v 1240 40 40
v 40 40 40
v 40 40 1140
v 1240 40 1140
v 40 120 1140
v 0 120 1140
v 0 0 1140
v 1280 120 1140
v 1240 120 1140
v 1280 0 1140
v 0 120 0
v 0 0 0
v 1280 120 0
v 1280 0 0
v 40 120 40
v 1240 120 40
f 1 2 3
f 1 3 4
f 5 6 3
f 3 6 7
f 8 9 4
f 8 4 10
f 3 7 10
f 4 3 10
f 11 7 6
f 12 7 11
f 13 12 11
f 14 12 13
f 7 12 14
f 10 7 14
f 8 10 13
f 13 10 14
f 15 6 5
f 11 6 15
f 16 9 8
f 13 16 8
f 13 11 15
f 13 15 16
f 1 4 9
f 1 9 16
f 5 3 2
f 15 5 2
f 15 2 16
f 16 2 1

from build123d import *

# Parameters (mm, degrees)
SKETCH1_W           = 1280
SKETCH1_H           = 1140
BOSS_EXTRUDE1_DEPTH = 40
SKETCH2_W           = 40
SKETCH2_H           = 1140
BOSS_EXTRUDE2_DEPTH = 80
SKETCH3_W           = 1200
SKETCH3_H           = 40
BOSS_EXTRUDE3_DEPTH = 80


with BuildPart() as part:
    # Sketch1 → Boss-Extrude1 (new body)
    with BuildSketch(Plane(origin=(0, 0, 0), x_dir=(1, 0, 0), z_dir=(0, 1, 0))):
        with Locations((640, -570)):
            Rectangle(SKETCH1_W, SKETCH1_H)
    extrude(amount=BOSS_EXTRUDE1_DEPTH)

    # Sketch2 → Boss-Extrude2 (add)
    with BuildSketch(Plane(origin=(0, 40, 0), x_dir=(1, 0, 0), z_dir=(0, 1, 0))):
        with Locations((1260, -570)):
            Rectangle(SKETCH2_W, SKETCH2_H)
        with Locations((20, -570)):
            Rectangle(SKETCH2_W, SKETCH2_H)
    extrude(amount=BOSS_EXTRUDE2_DEPTH)

    # Sketch3 → Boss-Extrude3 (add)
    with BuildSketch(Plane(origin=(0, 40, 0), x_dir=(1, 0, 0), z_dir=(0, 1, 0))):
        with Locations((640, -20)):
            Rectangle(SKETCH3_W, SKETCH3_H)
    extrude(amount=BOSS_EXTRUDE3_DEPTH)


solid = part.part
